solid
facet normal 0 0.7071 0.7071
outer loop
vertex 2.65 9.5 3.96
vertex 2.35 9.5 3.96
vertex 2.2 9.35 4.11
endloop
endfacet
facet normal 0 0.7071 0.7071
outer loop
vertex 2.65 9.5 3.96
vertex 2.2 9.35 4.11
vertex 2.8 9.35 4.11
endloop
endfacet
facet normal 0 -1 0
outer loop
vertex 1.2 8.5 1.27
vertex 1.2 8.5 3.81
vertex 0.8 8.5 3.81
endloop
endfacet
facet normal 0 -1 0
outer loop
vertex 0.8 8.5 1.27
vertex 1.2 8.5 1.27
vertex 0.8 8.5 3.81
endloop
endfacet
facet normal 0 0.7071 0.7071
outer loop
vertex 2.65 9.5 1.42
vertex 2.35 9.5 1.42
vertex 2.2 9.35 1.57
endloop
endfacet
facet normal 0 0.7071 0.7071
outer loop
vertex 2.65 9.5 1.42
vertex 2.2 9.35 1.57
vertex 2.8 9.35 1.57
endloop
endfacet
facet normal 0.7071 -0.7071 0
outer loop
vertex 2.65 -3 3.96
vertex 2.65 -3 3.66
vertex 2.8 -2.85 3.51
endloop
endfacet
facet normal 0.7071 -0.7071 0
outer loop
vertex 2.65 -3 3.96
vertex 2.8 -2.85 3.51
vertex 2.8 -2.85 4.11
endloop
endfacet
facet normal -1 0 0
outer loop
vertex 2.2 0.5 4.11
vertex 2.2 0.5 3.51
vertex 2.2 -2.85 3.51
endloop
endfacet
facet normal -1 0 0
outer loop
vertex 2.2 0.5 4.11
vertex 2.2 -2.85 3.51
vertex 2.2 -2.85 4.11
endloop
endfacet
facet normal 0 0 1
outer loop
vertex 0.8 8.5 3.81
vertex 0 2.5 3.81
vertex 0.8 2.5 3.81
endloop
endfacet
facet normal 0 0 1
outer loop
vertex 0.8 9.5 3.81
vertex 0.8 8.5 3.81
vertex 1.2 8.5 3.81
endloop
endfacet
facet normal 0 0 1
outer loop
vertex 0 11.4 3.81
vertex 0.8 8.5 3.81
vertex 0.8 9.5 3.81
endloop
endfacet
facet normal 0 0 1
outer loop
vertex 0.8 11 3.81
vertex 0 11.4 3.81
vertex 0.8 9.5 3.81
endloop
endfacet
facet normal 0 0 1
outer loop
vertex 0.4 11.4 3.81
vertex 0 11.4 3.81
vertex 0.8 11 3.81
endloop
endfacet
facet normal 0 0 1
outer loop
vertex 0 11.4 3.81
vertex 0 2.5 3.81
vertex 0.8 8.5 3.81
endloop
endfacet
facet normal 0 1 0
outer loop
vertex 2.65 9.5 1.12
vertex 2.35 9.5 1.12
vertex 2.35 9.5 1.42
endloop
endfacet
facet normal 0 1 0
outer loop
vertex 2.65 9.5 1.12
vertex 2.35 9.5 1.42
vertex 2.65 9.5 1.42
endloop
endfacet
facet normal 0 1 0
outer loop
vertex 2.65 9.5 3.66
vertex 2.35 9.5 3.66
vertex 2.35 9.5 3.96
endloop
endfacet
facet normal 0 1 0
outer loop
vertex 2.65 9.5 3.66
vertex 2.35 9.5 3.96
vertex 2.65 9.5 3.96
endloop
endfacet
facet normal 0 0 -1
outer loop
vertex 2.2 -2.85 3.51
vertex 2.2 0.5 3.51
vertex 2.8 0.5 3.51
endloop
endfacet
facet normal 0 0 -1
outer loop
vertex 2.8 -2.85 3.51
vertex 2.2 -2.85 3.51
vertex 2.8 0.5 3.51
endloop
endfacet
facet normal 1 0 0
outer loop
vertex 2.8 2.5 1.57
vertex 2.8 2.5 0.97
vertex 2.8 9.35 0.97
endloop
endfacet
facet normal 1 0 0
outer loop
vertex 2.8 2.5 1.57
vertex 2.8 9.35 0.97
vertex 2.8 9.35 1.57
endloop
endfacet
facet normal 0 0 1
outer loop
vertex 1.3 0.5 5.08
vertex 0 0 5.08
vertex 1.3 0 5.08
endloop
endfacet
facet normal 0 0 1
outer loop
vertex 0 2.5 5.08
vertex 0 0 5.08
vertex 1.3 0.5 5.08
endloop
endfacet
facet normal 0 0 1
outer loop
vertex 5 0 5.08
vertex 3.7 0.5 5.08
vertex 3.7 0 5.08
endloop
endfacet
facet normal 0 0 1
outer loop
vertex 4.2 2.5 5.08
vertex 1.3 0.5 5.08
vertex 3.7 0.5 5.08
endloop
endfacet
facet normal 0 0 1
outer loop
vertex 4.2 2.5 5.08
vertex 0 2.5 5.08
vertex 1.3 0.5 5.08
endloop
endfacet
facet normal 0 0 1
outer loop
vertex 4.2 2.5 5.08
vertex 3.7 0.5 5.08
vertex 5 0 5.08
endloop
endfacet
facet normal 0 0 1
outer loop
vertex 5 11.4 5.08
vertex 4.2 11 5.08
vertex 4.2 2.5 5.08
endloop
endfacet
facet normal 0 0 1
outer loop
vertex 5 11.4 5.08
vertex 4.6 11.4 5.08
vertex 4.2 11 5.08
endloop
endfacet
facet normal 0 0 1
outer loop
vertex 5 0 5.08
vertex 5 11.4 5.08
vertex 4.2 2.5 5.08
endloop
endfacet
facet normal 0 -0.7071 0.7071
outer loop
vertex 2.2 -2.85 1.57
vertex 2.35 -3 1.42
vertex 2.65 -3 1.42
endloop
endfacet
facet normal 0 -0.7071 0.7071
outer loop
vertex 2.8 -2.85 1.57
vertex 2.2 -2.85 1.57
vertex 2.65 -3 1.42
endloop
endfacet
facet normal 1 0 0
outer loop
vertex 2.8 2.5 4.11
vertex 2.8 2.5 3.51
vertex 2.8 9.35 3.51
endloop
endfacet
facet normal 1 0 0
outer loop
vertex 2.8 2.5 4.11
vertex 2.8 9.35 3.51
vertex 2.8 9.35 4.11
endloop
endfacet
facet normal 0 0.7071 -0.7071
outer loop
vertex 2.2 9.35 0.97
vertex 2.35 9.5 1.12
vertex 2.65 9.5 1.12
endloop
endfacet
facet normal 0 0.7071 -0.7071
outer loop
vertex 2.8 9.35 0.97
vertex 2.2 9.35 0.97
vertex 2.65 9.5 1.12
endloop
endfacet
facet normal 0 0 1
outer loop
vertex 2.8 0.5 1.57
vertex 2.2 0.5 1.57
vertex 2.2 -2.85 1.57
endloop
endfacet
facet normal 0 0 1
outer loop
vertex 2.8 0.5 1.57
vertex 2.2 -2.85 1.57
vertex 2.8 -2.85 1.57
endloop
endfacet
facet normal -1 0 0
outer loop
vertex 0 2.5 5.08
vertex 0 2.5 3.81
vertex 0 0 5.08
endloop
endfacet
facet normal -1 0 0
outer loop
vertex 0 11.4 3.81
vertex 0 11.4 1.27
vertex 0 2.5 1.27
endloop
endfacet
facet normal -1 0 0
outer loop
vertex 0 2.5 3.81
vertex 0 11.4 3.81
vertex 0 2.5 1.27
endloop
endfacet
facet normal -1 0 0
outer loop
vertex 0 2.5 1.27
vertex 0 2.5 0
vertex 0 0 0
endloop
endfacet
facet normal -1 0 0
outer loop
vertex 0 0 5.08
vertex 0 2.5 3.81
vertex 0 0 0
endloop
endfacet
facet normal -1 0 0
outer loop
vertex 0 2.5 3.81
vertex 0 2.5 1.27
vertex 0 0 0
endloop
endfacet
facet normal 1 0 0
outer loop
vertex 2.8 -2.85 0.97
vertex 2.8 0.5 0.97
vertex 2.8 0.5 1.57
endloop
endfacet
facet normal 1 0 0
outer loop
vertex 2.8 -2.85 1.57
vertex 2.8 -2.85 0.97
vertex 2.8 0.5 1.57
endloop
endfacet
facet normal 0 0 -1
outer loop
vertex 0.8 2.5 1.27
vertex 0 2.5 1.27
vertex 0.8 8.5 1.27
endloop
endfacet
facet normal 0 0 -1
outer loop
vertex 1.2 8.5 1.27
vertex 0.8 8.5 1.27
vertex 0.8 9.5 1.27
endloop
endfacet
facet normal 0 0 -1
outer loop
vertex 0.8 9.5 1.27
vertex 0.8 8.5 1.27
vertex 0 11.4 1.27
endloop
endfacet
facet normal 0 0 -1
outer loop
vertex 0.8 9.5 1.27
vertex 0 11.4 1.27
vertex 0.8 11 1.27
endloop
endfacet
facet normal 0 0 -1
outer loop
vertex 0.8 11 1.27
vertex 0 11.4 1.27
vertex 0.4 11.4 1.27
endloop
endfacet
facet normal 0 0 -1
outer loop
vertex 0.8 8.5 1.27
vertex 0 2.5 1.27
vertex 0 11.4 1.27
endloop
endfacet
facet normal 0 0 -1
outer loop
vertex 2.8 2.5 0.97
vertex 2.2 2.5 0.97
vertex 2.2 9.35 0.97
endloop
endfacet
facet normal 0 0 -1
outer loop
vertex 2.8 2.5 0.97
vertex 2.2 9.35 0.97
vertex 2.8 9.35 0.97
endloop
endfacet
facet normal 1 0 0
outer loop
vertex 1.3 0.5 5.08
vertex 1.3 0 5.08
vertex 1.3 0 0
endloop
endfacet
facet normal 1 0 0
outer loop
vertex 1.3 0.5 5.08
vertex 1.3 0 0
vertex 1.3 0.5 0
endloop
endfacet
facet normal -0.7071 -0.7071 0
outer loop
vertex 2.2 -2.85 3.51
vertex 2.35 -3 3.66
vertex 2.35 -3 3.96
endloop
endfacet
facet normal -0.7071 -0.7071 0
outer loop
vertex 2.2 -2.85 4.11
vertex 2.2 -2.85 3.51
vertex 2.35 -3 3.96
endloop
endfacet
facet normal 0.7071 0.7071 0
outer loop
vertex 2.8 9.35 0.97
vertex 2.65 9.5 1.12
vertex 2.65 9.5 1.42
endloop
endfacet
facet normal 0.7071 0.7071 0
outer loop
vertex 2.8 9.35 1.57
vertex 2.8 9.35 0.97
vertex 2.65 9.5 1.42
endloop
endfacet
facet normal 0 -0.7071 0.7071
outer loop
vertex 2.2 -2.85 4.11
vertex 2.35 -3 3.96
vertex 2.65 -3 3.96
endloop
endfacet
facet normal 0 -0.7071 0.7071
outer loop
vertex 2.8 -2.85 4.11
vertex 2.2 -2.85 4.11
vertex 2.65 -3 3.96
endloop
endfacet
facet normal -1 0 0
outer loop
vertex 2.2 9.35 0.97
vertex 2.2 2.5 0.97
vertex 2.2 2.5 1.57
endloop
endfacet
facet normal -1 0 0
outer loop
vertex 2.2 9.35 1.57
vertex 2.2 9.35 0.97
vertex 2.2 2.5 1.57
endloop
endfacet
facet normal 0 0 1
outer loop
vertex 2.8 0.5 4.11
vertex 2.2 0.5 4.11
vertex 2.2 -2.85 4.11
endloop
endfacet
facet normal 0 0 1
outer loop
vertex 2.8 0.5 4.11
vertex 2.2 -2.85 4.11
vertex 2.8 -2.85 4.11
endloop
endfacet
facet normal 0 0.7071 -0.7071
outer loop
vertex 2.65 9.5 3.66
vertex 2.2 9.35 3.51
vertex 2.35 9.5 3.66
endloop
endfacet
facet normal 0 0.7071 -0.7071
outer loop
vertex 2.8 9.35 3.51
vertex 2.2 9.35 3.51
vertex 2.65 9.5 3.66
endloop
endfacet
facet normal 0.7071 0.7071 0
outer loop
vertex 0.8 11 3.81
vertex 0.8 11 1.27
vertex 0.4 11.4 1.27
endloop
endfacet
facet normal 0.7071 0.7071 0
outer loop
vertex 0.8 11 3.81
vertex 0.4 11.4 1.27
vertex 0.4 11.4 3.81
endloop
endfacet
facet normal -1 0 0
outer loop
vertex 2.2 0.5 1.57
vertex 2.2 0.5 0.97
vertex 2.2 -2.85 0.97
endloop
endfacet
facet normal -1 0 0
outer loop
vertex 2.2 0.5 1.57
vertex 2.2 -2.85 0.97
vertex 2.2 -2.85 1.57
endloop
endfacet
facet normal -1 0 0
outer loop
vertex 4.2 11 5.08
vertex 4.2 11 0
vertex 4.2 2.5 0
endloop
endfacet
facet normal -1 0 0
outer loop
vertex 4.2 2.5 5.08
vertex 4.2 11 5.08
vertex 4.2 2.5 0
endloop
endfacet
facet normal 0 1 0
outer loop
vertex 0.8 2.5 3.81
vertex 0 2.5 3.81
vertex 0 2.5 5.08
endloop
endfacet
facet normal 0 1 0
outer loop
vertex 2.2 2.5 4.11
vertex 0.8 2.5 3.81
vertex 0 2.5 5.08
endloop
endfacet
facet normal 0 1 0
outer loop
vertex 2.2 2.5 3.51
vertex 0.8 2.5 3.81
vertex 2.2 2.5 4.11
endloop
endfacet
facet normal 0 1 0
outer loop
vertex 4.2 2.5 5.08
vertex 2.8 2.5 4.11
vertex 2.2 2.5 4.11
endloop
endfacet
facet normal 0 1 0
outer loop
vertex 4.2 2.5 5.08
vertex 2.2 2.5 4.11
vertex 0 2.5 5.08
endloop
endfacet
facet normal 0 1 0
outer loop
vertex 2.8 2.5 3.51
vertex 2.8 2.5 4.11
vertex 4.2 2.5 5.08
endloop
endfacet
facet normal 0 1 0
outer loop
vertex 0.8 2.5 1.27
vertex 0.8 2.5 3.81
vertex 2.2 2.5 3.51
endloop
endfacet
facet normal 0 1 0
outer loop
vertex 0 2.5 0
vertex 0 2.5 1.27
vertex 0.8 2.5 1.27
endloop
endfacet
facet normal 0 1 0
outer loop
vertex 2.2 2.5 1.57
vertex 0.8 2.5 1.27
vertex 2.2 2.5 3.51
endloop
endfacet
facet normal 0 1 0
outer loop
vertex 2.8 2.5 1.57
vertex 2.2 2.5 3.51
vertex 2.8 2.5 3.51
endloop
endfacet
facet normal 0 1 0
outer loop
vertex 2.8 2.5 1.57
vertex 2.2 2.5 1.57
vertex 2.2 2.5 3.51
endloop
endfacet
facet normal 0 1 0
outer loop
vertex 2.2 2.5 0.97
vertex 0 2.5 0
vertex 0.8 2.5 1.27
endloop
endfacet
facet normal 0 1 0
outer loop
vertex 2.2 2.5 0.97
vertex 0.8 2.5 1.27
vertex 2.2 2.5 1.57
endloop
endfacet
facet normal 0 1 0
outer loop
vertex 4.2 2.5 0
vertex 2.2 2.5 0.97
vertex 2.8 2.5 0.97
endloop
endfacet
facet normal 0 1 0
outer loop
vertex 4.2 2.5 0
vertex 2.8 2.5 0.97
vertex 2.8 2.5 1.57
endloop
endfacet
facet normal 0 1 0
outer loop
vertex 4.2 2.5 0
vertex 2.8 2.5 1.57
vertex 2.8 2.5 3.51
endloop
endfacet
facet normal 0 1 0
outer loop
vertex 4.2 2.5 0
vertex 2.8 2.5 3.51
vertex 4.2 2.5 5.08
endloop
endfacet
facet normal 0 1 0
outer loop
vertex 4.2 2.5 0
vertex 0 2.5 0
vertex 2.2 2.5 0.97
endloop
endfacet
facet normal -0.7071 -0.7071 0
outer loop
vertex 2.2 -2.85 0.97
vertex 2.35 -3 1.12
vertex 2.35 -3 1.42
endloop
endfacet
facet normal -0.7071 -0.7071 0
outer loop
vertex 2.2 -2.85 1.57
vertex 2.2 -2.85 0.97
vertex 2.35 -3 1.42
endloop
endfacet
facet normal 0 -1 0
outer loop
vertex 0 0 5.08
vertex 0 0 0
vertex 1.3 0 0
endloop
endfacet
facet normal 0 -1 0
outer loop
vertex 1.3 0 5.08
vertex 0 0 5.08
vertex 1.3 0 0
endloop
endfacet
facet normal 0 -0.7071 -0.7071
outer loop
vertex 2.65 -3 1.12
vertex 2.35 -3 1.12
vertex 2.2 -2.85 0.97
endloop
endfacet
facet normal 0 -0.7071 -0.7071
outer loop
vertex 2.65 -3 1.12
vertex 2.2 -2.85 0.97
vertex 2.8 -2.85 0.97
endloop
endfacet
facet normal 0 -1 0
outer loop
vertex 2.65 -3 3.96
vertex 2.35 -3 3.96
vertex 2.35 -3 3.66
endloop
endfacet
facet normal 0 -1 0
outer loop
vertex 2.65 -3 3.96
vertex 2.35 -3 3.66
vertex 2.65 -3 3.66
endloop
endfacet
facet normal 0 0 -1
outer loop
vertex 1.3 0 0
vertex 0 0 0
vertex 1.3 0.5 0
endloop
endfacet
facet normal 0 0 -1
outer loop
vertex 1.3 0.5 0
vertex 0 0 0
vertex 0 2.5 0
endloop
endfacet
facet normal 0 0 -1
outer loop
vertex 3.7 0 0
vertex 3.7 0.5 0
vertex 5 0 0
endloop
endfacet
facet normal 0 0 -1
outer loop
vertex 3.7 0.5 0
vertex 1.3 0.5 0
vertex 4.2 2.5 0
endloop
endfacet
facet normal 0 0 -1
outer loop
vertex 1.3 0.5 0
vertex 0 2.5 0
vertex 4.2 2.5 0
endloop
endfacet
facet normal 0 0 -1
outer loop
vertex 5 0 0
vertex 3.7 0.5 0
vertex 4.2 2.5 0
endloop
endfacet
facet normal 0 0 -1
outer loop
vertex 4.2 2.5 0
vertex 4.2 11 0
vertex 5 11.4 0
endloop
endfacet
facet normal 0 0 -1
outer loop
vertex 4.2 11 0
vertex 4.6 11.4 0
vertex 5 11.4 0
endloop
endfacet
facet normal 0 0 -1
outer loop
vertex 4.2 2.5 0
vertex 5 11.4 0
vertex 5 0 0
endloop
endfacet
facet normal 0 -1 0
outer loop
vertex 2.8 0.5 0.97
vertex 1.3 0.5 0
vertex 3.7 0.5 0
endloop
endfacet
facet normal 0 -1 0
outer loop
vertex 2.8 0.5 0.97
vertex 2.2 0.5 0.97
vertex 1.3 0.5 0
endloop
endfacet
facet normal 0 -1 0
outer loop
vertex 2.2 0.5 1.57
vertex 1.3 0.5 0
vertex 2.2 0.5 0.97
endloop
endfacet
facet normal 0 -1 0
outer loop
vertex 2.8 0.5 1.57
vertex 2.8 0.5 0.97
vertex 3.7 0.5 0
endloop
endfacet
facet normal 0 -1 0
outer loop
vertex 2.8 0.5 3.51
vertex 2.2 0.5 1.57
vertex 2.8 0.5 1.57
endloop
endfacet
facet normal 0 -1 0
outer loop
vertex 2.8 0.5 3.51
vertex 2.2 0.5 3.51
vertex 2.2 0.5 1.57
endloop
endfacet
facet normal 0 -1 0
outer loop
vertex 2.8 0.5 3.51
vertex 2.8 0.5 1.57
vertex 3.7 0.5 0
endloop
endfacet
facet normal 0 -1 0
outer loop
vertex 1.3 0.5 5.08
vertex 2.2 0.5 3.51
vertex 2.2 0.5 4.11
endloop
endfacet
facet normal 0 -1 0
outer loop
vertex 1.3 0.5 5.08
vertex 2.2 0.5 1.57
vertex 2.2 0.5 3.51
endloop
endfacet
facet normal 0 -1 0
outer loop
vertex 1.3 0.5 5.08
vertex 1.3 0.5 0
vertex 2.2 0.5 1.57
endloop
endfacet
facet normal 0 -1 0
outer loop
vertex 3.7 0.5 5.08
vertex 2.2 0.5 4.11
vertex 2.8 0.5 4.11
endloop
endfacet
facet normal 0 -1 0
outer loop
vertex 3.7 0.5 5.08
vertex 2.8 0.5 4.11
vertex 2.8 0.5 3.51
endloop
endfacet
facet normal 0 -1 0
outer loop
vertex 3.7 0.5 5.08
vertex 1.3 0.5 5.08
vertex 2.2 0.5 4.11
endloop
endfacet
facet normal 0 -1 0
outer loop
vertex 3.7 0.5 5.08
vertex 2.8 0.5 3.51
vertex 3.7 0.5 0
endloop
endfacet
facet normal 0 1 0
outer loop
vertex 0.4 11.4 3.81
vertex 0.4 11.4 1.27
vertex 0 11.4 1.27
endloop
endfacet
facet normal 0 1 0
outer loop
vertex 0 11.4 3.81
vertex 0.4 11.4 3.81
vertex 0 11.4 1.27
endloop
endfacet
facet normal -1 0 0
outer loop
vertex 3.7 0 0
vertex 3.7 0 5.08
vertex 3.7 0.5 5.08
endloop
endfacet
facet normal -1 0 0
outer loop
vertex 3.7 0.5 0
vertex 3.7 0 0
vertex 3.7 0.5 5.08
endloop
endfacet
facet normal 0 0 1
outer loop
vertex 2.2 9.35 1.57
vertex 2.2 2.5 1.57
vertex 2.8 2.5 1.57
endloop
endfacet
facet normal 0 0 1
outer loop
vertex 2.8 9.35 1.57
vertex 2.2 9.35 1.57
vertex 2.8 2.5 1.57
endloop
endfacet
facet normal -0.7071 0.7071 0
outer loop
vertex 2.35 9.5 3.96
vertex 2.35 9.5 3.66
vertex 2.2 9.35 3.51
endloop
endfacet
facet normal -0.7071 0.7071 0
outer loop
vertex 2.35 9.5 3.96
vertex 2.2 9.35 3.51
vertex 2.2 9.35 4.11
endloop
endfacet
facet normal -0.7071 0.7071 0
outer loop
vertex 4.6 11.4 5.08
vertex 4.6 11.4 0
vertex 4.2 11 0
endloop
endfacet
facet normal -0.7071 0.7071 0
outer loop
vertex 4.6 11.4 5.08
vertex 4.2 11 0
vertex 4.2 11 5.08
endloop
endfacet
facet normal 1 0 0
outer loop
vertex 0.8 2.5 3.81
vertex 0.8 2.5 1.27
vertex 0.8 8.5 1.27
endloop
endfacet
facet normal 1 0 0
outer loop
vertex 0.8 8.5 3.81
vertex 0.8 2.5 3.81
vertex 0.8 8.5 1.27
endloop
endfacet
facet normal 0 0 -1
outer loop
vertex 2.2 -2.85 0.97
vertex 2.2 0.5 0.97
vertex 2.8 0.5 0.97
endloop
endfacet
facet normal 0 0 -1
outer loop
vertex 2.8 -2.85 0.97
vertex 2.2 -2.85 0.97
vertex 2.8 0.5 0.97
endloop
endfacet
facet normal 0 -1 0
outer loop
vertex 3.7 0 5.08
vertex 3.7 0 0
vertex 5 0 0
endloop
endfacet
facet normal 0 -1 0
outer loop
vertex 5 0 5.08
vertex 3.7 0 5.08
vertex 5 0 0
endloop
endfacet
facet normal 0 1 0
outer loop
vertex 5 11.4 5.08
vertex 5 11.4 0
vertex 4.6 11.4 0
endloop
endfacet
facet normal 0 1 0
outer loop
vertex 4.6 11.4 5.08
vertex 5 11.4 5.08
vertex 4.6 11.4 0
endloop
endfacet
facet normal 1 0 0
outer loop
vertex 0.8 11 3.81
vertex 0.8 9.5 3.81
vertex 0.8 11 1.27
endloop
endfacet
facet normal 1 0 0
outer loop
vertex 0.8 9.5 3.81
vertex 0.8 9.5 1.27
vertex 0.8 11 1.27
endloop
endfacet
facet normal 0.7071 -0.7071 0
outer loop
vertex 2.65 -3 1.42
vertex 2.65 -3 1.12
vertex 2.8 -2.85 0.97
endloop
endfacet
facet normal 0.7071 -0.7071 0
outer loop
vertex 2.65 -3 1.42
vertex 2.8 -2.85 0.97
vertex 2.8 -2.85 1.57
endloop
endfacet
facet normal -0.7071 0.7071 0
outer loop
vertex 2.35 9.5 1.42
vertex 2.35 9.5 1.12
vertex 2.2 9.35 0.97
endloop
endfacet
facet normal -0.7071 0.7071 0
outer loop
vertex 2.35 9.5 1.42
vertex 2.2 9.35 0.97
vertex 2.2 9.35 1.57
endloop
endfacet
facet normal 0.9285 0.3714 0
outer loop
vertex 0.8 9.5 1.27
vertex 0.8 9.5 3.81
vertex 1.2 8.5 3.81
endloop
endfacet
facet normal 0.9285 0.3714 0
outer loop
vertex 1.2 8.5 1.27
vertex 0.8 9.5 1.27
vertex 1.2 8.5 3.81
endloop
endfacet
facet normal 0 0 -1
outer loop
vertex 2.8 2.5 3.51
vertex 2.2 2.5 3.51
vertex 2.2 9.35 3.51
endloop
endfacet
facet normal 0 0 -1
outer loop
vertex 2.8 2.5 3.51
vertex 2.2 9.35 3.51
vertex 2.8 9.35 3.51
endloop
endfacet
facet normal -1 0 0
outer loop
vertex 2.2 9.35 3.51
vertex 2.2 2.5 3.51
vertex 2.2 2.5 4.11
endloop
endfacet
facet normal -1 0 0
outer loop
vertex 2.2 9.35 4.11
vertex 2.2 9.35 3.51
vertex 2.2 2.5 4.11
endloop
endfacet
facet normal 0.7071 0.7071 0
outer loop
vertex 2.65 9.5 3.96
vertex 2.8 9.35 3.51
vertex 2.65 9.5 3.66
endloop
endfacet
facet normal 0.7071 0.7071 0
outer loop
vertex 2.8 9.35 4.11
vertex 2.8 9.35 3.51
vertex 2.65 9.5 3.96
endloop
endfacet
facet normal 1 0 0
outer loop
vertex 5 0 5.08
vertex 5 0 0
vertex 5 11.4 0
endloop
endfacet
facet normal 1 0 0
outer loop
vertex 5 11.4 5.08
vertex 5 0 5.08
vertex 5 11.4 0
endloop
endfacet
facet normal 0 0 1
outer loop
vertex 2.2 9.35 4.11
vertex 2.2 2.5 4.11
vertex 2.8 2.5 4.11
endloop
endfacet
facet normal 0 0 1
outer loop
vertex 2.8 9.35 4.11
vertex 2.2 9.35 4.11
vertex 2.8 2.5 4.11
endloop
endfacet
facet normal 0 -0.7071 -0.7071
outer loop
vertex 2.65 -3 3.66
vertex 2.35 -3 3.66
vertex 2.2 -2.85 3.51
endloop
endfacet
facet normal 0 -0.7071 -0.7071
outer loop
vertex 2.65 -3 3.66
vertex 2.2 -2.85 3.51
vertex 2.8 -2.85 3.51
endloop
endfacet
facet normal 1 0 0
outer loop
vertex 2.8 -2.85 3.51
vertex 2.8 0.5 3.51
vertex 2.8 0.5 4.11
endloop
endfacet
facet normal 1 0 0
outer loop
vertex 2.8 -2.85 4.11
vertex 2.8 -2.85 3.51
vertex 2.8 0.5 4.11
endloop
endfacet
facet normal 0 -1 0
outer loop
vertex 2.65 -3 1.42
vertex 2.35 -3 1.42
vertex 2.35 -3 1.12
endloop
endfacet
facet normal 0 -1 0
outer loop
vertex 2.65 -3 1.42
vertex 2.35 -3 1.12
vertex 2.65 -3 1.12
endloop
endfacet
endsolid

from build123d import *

# Parameters (mm, degrees)
BOSS_EXTRU_1_DEPTH      = 5.08
ESQUISSE3_W             = 0.8
ESQUISSE3_H             = 1.27
ENL_V_MAT_EXTRU_1_DEPTH = 8.9
ESQUISSE4_W             = 2.4
ESQUISSE4_H             = 0.5
ENL_V_MAT_EXTRU_2_DEPTH = 6.08
ESQUISSE2_W             = 0.6
ESQUISSE2_H             = 0.6
BOSS_EXTRU_2_DEPTH      = 3.5
BOSS_EXTRU_2_DEPTH_BACK = 9
BOSS_EXTRU_3_DEPTH      = 2.54
CHANFREIN4_SIZE         = 0.15
CHANFREIN5_SIZE         = 0.4


with BuildPart() as part:
    # Esquisse1 → Boss.-Extru.1 (new body)
    with BuildSketch(Plane.XY):
        Polygon((0, 11.4), (0, 0), (5, 0), (5, 11.4), (4.2, 11.4), (4.2, 2.5), (0.8, 2.5), (0.8, 11.4), align=None)
    extrude(amount=BOSS_EXTRU_1_DEPTH)

    # Esquisse3 → Enlèv. mat.-Extru.1 (cut)
    with BuildSketch(Plane(origin=(0, 11.4, 0), x_dir=(1, 0, 0), z_dir=(0, 1, 0))):
        with Locations((0.4, -0.635)):
            Rectangle(ESQUISSE3_W, ESQUISSE3_H)
        with Locations((0.4, -4.445)):
            Rectangle(ESQUISSE3_W, ESQUISSE3_H)
    extrude(amount=-ENL_V_MAT_EXTRU_1_DEPTH, mode=Mode.SUBTRACT)

    # Esquisse4 → Enlèv. mat.-Extru.2 (cut, through all)
    with BuildSketch(Plane.XY.offset(5.08)):
        with Locations((2.5, 0.25)):
            Rectangle(ESQUISSE4_W, ESQUISSE4_H)
    extrude(amount=-ENL_V_MAT_EXTRU_2_DEPTH, mode=Mode.SUBTRACT)

    # Esquisse2 → Boss.-Extru.2 (add, two sides)
    with BuildSketch(Plane.XZ.offset(-0.5)) as boss_extru_2_sk:
        with Locations((2.5, 3.81)):
            Rectangle(ESQUISSE2_W, ESQUISSE2_H)
        with Locations((2.5, 1.27)):
            Rectangle(ESQUISSE2_W, ESQUISSE2_H)
    extrude(amount=BOSS_EXTRU_2_DEPTH)
    extrude(boss_extru_2_sk.sketch, amount=-BOSS_EXTRU_2_DEPTH_BACK)

    # Esquisse5 → Boss.-Extru.3 (add)
    with BuildSketch(Plane.XY.offset(3.81)):
        Polygon((0.8, 9.5), (1.2, 8.5), (0.8, 8.5), align=None)
    extrude(amount=-BOSS_EXTRU_3_DEPTH)

    # Chanfrein4
    chanfrein4_edges = [part.edges().sort_by_distance(p)[0] for p in [
        (2.8, 9.5, 3.81),
        (2.5, 9.5, 3.51),
        (2.2, 9.5, 3.81),
        (2.5, 9.5, 4.11),
        (2.8, -3, 3.81),
        (2.5, -3, 4.11),
        (2.2, -3, 3.81),
        (2.5, -3, 3.51),
        (2.8, 9.5, 1.27),
        (2.5, 9.5, 0.97),
        (2.2, 9.5, 1.27),
        (2.5, 9.5, 1.57),
        (2.8, -3, 1.27),
        (2.5, -3, 1.57),
        (2.2, -3, 1.27),
        (2.5, -3, 0.97),
    ]]
    chamfer(chanfrein4_edges, length=CHANFREIN4_SIZE)

    # Chanfrein5
    chanfrein5_edges = [part.edges().sort_by_distance(p)[0] for p in [
        (4.2, 11.4, 2.54),
        (0.8, 11.4, 2.54),
    ]]
    chamfer(chanfrein5_edges, length=CHANFREIN5_SIZE)


solid = part.part
